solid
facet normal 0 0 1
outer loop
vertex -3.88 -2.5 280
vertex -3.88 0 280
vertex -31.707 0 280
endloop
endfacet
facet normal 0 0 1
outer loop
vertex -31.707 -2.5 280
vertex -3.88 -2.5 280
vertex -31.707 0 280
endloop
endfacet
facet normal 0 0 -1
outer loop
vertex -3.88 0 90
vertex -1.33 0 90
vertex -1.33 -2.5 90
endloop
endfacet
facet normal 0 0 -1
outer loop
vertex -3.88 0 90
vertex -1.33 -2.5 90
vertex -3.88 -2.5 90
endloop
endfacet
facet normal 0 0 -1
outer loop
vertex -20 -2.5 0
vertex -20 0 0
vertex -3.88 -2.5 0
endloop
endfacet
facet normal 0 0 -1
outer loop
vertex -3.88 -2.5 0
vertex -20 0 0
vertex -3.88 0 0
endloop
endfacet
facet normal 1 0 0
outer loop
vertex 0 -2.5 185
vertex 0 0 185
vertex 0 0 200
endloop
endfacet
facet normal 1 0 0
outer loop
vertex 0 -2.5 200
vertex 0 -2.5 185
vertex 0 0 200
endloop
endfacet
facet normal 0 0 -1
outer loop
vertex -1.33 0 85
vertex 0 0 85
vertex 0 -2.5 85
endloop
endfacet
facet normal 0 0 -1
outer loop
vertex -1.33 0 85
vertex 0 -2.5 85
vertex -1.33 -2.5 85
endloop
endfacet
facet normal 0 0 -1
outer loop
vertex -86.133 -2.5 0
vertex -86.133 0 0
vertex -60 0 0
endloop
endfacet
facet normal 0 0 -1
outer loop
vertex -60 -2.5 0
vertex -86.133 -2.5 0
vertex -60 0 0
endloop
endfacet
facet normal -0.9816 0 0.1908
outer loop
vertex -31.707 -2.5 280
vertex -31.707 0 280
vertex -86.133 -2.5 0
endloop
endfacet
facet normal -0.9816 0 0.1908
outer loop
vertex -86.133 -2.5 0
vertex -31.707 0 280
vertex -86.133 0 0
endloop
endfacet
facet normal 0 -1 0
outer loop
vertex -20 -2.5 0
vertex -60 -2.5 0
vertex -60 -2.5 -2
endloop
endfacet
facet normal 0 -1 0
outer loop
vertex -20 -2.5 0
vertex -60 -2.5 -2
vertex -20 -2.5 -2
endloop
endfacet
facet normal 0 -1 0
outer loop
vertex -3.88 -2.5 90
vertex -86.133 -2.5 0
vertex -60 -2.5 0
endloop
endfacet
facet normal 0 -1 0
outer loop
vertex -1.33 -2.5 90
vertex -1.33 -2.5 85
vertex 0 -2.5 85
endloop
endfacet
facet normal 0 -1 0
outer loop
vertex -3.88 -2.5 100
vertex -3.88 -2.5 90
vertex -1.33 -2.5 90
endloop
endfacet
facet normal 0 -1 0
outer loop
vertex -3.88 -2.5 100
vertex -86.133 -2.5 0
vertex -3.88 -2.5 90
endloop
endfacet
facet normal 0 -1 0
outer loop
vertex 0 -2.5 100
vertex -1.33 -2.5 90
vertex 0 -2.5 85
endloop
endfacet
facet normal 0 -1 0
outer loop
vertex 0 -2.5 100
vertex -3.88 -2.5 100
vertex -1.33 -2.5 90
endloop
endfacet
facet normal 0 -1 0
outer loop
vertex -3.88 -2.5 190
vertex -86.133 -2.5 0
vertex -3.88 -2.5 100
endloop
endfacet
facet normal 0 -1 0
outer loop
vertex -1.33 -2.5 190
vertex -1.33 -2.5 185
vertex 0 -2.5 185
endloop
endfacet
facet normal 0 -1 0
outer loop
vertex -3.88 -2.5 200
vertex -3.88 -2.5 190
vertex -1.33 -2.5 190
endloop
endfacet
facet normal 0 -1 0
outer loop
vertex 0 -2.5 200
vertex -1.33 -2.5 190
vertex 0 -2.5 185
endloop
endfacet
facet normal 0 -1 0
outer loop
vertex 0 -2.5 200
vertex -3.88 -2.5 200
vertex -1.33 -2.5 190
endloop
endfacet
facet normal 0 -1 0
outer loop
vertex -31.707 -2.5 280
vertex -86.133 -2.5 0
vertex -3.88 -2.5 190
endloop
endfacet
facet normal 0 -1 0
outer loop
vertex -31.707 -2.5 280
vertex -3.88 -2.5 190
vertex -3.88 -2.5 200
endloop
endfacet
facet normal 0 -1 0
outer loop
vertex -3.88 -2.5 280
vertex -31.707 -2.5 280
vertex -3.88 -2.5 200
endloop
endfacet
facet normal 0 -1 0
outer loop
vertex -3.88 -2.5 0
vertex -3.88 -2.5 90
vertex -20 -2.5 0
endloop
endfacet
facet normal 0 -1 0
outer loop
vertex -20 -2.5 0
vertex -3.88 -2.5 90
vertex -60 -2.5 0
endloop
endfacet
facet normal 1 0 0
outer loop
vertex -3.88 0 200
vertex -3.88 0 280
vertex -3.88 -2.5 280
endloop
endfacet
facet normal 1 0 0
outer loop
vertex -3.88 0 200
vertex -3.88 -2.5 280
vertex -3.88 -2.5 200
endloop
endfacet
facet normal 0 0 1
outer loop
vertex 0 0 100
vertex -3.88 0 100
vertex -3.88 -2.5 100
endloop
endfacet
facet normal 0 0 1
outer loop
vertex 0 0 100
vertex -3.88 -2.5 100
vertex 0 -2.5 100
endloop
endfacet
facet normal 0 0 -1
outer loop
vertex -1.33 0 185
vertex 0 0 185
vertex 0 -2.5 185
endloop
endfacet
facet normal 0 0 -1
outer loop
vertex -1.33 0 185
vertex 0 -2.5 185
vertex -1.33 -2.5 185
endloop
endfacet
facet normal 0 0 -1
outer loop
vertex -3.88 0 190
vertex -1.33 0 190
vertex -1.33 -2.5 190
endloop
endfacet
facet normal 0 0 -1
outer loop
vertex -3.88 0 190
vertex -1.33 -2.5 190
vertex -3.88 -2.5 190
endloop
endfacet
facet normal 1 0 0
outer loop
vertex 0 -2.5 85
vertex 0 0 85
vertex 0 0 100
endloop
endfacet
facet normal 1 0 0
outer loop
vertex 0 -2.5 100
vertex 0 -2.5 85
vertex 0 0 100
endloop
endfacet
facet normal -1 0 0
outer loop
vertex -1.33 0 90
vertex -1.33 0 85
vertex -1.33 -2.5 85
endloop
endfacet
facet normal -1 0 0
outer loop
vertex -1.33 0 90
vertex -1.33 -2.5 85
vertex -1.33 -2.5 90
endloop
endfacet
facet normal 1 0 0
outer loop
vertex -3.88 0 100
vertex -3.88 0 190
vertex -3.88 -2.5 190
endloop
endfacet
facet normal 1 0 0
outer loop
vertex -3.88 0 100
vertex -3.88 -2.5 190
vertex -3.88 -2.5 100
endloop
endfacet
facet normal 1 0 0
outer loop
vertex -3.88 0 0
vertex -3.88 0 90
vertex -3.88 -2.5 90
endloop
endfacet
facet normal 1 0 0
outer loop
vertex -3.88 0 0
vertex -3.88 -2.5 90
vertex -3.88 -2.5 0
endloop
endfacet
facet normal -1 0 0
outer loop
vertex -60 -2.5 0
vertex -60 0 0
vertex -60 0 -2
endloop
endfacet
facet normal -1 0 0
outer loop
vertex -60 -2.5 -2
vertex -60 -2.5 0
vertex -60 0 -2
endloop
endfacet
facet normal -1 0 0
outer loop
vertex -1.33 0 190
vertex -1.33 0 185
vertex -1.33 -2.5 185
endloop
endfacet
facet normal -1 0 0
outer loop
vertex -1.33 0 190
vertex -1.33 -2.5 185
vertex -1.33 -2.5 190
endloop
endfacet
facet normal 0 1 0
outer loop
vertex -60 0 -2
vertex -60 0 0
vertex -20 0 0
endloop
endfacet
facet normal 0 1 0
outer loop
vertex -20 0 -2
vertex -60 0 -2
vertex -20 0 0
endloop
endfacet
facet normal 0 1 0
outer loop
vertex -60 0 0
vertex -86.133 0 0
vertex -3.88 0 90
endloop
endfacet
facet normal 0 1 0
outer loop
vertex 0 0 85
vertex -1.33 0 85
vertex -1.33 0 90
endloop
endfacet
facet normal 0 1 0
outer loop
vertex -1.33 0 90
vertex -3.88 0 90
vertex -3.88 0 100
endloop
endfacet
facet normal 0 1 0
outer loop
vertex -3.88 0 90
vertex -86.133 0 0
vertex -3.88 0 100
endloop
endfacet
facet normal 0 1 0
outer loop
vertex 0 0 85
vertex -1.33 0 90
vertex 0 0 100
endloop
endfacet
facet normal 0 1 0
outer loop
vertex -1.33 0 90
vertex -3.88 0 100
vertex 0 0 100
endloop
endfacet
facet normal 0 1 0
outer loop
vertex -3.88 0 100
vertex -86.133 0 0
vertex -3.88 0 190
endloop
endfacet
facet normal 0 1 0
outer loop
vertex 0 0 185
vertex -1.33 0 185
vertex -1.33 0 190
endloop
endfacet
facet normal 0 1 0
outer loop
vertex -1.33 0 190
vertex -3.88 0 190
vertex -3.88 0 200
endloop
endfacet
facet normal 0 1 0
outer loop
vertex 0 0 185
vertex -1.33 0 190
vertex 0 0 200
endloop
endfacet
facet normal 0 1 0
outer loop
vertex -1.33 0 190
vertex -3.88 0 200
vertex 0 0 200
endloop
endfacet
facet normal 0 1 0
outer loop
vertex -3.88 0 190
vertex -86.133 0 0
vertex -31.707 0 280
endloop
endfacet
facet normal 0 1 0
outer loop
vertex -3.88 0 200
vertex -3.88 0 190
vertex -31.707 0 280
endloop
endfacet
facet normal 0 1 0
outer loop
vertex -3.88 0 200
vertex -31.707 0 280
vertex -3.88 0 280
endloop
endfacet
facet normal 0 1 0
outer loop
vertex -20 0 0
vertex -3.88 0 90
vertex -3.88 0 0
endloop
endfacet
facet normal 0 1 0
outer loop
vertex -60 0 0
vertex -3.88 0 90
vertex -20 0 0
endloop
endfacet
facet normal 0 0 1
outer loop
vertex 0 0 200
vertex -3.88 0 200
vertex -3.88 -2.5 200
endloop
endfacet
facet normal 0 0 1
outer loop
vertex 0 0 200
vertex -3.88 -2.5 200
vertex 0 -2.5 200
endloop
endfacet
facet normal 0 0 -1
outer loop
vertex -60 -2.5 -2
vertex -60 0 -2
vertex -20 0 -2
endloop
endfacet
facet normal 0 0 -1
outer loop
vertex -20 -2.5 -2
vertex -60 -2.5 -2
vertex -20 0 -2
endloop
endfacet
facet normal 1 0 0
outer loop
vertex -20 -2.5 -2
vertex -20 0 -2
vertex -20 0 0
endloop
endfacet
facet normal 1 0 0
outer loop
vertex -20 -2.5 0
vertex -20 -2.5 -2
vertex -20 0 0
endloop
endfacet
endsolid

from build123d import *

# Parameters (mm, degrees)
F1_DEPTH = 2.5
F3_DEPTH = 25


with BuildPart() as f1:
    # F0 (on Front) → F1 (new body)
    with BuildSketch(Plane.XZ):
        Polygon((-31.706513, 280), (-86.133, 0), (-60, 0), (-60, -2), (-20, -2), (-20, 0), (0, 0), (0, 280), align=None)
    extrude(amount=F1_DEPTH)

    # F2 (on Front) → F3 (cut)
    with BuildSketch(Plane.XZ):
        Polygon((25.523714, 0), (25.523714, 285.471179), (-3.88, 285.471179), (-3.88, 200), (3.67, 200), (3.67, 185), (-1.33, 185), (-1.33, 190), (-3.88, 190), (-3.88, 100), (3.67, 100), (3.67, 85), (-1.33, 85), (-1.33, 90), (-3.88, 90), (-3.88, 0), align=None)
    extrude(amount=F3_DEPTH, mode=Mode.SUBTRACT)


solid = f1.part
